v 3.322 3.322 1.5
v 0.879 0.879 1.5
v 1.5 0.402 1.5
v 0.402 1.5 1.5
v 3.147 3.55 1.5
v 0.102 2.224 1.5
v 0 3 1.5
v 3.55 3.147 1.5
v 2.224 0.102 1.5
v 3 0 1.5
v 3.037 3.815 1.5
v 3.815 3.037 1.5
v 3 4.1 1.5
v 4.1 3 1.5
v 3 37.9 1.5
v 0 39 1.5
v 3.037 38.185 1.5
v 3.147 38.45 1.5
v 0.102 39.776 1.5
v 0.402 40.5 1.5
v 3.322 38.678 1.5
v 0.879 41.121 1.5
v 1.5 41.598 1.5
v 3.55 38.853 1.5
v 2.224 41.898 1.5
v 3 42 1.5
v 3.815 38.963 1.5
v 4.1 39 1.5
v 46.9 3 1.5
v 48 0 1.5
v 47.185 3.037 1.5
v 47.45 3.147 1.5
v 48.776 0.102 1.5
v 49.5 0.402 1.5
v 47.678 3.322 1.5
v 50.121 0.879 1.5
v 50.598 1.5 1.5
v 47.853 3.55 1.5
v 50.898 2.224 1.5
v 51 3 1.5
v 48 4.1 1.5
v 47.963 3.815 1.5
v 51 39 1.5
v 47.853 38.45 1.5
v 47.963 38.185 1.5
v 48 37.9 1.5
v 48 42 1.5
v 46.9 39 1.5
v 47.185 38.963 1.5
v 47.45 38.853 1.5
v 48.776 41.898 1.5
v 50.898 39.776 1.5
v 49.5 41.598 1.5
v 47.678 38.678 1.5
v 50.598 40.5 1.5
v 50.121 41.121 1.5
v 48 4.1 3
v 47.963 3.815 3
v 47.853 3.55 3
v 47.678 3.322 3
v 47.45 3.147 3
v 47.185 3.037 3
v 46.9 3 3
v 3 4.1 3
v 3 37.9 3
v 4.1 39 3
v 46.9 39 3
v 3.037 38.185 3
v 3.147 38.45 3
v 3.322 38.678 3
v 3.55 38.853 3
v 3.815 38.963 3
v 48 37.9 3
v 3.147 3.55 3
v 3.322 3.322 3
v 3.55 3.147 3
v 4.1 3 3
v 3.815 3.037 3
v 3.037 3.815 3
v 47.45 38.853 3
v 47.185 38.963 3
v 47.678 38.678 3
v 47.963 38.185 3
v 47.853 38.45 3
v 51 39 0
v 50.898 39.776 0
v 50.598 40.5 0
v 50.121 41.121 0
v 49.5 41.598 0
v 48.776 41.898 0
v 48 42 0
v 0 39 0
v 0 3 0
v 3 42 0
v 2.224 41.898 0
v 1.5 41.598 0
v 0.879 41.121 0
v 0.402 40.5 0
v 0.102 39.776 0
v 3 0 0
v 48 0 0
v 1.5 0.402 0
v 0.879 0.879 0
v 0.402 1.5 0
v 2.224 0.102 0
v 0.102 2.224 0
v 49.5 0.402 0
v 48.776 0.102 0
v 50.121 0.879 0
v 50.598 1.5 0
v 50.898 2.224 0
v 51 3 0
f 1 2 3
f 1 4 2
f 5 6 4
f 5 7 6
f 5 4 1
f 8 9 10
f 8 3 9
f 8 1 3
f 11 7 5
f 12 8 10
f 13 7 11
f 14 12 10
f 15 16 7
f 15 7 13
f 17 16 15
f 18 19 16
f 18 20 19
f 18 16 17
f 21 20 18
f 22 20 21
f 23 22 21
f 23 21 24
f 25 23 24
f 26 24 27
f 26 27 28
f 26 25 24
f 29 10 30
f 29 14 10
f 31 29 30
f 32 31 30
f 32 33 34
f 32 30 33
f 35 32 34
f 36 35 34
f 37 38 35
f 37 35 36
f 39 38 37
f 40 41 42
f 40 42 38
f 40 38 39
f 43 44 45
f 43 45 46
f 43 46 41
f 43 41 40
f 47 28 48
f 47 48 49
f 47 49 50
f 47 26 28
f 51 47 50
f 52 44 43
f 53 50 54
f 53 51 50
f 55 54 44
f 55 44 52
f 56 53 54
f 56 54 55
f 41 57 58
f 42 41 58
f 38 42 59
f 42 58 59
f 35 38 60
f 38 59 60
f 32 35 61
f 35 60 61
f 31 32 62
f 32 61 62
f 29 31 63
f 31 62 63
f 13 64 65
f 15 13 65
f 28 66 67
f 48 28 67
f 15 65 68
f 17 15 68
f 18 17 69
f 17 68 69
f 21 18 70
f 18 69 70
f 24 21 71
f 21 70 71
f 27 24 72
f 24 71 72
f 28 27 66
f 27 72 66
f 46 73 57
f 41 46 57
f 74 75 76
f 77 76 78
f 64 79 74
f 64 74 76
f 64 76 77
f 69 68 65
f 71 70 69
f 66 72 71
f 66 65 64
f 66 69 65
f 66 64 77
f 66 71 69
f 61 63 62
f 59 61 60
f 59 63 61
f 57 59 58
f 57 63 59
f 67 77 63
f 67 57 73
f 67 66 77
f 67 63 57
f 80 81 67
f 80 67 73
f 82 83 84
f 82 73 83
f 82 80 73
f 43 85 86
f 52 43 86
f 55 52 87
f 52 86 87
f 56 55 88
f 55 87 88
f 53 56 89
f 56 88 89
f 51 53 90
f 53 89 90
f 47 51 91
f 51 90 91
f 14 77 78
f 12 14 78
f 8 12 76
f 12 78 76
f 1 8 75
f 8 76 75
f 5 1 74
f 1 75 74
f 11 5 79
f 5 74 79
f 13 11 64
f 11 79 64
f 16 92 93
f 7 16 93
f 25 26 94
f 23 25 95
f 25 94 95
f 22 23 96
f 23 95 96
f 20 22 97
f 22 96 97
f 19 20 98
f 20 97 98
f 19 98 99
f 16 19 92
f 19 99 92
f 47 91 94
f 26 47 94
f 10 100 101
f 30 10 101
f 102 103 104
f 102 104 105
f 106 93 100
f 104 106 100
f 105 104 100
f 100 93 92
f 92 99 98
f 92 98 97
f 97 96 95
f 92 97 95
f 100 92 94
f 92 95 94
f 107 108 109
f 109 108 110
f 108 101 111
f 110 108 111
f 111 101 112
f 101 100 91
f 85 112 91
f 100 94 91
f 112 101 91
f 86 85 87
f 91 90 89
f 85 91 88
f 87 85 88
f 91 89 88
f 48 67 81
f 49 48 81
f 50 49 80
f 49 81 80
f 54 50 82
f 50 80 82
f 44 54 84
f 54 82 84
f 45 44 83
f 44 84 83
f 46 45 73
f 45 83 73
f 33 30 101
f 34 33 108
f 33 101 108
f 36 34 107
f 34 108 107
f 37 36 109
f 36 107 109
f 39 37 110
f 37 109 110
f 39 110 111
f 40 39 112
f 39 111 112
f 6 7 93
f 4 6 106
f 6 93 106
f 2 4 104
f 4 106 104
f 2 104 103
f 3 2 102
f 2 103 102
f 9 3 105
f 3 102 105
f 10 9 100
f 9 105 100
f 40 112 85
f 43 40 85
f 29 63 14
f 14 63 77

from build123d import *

# Parameters (mm, degrees)
EXTRUDE_1_DEPTH     = 3
SKETCH_2_OUTSIDE_W  = 66.228
SKETCH_2_OUTSIDE_H  = 57.228
CUT_EXTRUDE_1_DEPTH = 1.5


with BuildPart() as part:
    # 草图1 → 凸台-拉伸1 (new body)
    with BuildSketch(Plane.XY):
        with BuildLine():
            Line((3, 0), (48, 0))
            ThreePointArc((48, 0), (50.121320344, 0.878679656), (51, 3))
            Line((51, 3), (51, 39))
            ThreePointArc((51, 39), (50.121320344, 41.121320344), (48, 42))
            Line((48, 42), (3, 42))
            ThreePointArc((3, 42), (0.878679656, 41.121320344), (0, 39))
            Line((0, 39), (0, 3))
            ThreePointArc((0, 3), (0.878679656, 0.878679656), (3, 0))
        make_face()
    extrude(amount=EXTRUDE_1_DEPTH)

    # 草图2 outside → 切除-拉伸1 (cut)
    with BuildSketch(Plane.XY.offset(3)):
        with Locations((25.5, 21)):
            Rectangle(SKETCH_2_OUTSIDE_W, SKETCH_2_OUTSIDE_H)
        with BuildLine():
            Line((4.1, 39), (46.9, 39))
            ThreePointArc((46.9, 39), (47.677817459, 38.677817459), (48, 37.9))
            Line((48, 37.9), (48, 4.1))
            ThreePointArc((48, 4.1), (47.677817459, 3.322182541), (46.9, 3))
            Line((46.9, 3), (4.1, 3))
            ThreePointArc((4.1, 3), (3.322182541, 3.322182541), (3, 4.1))
            Line((3, 4.1), (3, 37.9))
            ThreePointArc((3, 37.9), (3.322182541, 38.677817459), (4.1, 39))
        make_face(mode=Mode.SUBTRACT)
    extrude(amount=-CUT_EXTRUDE_1_DEPTH, mode=Mode.SUBTRACT)


solid = part.part
